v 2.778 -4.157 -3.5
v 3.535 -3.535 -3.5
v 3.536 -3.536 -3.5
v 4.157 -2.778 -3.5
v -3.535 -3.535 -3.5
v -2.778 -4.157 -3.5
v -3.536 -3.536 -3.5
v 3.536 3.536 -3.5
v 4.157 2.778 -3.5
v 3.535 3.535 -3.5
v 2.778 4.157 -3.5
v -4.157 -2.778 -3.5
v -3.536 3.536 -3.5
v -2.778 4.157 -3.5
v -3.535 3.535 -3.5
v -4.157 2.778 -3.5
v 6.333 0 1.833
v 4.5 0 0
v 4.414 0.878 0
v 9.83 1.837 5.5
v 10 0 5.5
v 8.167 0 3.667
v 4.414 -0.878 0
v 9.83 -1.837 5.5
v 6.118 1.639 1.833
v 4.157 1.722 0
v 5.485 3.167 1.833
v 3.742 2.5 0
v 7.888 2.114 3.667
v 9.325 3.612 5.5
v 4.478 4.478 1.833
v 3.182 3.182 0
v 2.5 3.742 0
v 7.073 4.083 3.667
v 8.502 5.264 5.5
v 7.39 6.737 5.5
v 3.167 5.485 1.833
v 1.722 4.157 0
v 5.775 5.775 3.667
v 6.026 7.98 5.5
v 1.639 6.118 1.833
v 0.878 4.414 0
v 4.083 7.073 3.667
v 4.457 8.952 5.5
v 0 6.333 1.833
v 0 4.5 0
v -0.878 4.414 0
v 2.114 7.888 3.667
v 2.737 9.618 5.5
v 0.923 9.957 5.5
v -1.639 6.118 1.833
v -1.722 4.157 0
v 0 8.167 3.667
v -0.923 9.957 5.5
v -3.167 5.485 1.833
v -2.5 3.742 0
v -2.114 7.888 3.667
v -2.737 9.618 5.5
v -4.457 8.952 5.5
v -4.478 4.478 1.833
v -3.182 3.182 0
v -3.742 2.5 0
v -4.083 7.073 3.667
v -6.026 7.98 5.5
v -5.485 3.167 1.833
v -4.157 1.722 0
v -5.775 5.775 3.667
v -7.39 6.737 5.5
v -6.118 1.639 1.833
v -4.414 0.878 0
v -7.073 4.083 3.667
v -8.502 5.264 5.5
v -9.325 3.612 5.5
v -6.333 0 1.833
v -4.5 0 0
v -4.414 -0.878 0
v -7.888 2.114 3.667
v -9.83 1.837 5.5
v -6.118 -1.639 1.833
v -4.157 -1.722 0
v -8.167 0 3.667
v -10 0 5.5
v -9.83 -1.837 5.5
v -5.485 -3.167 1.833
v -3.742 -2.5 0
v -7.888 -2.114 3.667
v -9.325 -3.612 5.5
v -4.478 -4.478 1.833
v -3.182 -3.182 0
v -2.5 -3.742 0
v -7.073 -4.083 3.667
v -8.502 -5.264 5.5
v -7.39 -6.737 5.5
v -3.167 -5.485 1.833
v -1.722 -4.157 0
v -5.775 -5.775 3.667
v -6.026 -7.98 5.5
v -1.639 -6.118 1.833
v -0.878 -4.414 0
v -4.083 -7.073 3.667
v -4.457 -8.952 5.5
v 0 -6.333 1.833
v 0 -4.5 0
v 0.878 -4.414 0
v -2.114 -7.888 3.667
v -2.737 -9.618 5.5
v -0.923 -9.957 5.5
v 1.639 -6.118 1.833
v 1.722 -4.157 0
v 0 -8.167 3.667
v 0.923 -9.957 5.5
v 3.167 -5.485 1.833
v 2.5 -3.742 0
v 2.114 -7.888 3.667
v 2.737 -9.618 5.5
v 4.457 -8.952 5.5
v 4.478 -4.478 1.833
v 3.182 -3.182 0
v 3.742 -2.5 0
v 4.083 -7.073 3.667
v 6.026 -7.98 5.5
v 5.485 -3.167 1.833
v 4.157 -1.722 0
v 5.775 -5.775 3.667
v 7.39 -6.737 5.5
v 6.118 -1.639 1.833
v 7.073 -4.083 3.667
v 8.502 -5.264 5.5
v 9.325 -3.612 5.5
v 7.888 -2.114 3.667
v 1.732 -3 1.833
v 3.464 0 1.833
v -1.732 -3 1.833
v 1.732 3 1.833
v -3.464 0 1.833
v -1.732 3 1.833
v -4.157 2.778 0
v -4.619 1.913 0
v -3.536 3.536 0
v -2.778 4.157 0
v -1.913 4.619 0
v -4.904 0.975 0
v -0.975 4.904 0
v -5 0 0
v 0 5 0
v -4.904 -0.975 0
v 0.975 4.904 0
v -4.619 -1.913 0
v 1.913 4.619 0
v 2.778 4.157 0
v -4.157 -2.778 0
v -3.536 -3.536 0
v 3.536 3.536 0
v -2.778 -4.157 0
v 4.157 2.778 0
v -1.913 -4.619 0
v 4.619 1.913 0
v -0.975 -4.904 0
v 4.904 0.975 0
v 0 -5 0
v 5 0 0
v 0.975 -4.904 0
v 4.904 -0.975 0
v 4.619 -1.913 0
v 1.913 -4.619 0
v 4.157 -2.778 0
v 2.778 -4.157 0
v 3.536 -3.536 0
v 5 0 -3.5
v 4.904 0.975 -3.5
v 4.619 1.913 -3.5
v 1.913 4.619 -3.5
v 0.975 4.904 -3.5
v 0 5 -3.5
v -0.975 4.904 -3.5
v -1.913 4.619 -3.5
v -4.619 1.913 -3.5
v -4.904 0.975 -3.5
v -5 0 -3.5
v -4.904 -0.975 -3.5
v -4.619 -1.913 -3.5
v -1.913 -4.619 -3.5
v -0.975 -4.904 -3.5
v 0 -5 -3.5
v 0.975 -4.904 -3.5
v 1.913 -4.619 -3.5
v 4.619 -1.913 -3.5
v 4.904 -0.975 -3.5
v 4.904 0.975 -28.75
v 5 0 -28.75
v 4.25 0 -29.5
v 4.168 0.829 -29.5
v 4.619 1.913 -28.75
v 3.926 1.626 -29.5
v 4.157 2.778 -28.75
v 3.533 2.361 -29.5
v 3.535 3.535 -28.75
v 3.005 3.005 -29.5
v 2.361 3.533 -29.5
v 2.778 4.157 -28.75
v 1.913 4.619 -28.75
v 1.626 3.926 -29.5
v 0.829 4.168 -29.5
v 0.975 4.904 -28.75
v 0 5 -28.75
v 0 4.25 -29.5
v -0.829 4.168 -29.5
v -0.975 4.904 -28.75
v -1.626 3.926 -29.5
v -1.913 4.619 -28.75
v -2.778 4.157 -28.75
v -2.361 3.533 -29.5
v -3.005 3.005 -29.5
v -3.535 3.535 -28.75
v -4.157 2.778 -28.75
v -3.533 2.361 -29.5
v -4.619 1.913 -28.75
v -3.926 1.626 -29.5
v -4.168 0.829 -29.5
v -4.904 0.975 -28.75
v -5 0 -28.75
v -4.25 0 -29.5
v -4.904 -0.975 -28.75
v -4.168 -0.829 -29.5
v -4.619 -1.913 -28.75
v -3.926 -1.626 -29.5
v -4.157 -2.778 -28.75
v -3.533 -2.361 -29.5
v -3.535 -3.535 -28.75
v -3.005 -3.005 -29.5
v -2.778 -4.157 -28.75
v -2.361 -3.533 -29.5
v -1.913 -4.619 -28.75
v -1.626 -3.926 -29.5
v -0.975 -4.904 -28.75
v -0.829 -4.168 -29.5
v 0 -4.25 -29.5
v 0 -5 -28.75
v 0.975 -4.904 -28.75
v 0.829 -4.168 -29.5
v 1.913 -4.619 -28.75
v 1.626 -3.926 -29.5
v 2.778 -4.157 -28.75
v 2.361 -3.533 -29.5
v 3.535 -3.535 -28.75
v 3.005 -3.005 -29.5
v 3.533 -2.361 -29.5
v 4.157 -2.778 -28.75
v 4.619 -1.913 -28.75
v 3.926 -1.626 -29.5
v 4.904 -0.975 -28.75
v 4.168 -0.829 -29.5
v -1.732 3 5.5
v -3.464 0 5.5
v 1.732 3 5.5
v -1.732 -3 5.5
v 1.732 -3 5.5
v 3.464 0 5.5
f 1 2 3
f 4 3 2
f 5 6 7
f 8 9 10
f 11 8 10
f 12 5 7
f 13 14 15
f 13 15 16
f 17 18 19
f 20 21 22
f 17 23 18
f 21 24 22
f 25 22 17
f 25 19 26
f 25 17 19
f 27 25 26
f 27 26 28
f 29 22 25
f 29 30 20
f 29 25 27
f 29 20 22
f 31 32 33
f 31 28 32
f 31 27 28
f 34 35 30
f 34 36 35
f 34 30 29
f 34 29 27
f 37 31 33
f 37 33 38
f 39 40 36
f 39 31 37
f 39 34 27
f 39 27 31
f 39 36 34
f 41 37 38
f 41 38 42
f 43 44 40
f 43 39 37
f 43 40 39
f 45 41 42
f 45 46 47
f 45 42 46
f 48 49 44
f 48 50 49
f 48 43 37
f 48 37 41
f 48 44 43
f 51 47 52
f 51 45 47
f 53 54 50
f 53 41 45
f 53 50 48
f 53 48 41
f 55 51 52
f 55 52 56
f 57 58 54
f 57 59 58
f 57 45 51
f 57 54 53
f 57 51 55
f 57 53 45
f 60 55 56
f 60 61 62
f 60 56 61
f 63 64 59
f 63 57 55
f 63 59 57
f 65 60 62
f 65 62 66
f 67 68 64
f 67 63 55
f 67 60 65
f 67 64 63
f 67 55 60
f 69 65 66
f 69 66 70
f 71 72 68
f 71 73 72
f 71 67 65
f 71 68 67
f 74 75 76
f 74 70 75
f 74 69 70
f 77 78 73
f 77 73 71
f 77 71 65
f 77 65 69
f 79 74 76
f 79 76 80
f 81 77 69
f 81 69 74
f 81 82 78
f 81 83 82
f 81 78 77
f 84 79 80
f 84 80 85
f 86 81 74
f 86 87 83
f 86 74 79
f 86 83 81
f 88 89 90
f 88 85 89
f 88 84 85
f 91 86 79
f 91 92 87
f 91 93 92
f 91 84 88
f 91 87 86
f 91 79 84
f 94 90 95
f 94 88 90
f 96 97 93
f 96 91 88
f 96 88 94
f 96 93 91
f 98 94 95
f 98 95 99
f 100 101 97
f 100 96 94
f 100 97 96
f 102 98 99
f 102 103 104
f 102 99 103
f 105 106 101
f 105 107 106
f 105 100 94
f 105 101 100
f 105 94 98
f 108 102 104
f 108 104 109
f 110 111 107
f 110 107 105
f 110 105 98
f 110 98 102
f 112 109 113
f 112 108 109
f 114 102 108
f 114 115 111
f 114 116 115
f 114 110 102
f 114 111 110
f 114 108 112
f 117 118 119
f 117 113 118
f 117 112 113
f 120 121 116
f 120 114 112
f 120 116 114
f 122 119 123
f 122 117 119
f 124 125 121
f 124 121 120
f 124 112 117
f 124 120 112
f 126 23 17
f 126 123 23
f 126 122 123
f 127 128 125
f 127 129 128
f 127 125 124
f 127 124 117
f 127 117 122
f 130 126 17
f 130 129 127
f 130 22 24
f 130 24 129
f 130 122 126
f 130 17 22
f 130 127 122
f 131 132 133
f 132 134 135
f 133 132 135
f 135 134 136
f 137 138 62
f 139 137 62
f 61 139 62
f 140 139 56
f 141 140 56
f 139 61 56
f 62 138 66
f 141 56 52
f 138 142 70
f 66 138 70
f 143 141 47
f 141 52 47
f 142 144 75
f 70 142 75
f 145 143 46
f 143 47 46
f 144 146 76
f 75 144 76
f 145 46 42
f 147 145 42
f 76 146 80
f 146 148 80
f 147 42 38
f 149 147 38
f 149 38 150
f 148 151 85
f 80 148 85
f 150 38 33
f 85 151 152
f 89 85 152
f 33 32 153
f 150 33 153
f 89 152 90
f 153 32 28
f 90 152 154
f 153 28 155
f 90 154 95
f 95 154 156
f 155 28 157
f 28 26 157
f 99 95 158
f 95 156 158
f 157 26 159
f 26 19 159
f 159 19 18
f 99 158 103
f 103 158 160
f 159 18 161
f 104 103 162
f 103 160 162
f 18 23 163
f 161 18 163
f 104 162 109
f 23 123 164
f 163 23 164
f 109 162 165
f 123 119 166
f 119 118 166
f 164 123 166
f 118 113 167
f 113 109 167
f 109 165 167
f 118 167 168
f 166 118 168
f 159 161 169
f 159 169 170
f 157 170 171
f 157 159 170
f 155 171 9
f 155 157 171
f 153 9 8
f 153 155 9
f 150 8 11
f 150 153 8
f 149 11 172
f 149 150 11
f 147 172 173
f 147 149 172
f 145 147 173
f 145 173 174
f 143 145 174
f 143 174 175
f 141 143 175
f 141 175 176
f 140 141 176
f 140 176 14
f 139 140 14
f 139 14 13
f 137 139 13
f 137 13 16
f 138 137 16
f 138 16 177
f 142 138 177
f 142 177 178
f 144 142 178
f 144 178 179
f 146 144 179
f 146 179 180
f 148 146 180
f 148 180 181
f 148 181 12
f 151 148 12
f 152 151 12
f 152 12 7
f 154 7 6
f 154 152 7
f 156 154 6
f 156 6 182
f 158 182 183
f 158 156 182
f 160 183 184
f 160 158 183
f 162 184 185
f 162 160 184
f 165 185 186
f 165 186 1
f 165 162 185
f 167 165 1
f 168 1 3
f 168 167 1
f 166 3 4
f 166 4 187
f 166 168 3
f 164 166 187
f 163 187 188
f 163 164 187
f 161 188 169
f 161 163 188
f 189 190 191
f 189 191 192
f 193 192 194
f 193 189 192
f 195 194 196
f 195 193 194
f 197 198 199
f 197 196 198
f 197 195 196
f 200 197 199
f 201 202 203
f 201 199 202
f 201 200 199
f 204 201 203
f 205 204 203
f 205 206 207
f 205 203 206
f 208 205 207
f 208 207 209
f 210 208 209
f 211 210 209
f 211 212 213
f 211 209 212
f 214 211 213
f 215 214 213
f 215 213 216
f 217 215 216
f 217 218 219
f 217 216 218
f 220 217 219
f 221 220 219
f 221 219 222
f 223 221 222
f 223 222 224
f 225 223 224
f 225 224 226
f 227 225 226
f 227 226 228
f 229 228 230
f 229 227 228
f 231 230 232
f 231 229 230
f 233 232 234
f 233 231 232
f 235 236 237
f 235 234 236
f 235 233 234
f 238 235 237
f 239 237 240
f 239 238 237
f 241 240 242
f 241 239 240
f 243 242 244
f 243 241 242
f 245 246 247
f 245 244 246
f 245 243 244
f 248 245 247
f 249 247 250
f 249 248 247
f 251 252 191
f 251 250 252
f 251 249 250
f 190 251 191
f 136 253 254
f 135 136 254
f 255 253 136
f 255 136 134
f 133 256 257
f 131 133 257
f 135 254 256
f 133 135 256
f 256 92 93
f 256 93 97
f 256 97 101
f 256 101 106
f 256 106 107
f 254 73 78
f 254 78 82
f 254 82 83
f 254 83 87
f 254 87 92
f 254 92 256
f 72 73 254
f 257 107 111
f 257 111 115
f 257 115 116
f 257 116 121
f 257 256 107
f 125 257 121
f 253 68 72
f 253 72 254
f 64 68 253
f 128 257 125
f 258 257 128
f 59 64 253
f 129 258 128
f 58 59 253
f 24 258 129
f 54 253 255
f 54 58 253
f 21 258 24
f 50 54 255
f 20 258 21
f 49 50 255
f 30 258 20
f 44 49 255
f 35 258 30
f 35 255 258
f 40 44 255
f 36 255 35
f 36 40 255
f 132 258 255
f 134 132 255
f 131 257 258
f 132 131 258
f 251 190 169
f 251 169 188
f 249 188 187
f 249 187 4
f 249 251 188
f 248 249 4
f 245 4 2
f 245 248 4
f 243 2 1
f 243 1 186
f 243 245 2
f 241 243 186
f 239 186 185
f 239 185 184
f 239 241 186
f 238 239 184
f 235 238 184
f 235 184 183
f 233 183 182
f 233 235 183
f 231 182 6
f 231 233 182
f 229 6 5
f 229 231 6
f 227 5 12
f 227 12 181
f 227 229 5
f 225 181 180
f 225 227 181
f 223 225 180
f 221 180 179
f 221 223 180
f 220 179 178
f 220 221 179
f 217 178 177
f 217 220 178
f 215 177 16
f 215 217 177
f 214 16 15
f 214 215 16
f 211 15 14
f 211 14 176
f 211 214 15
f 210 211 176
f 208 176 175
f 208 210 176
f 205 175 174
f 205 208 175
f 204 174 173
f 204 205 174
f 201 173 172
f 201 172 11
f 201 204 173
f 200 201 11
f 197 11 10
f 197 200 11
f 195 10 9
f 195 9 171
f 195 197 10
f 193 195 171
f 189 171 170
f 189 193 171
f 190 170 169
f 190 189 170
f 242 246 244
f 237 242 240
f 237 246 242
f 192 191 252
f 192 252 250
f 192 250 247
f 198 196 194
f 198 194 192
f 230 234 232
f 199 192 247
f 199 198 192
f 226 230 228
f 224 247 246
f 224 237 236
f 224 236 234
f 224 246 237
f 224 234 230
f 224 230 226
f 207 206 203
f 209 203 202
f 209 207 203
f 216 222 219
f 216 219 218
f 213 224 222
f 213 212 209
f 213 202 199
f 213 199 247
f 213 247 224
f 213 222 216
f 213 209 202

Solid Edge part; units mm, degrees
sketch "Sketch1" plane through (0, 0, 0) normal (0, 0, 1) x (1, 0, 0)
  circle A0 centre (0, 0) radius 10
  dimension "D1" = 20
extrude "Protrusion1" add sketch "Sketch1" along normal blind 5.5
sketch "Sketch2" plane through (0, 0, 0) normal (0, 0, -1) x (1, 0, 0)
  circle A0 centre (0, 0) radius 5
extrude "Protrusion2" add sketch "Sketch2" along normal blind 29.5
sketch "Sketch3" plane through (0, 0, -29.5) normal (0, 0, -1) x (1, 0, 0)
  circle A0 centre (0, 0) radius 4.9997
extrude "Cutout1" cut sketch "Sketch3" against normal blind 26 flip side to cut
chamfer "Chamfer_1" distance 0.75 angle 45 1 edges at (-4.9997, 0, -29.5)
sketch "Sketch4" plane through (0, 0, 5.5) normal (0, 0, 1) x (1, 0, 0)
  line L0 (-1.7321, 3) -> (1.7321, 3)
  line L1 (3.4641, 0) -> (1.7321, 3)
  line L2 (1.7321, -3) -> (3.4641, 0)
  line L3 (-1.7321, -3) -> (1.7321, -3)
  line L4 (-3.4641, 0) -> (-1.7321, -3)
  line L5 (-1.7321, 3) -> (-3.4641, 0)
  dimension "D1" = 6
extrude "Cutout2" cut sketch "Sketch4" against normal blind 3.6667
sketch "Sketch5" plane through (0, 0, 0) normal (0, -1, 0) x (1, 0, 0)
  line L0 (10, 5.5) -> (4.5, 0)
  line L1 (4.5, 0) -> (10, 0)
  line L2 (10, 0) -> (10, 5.5)
revolve "RevolvedCutout1" cut sketch "Sketch5" angle 360 about axis through (0, 0, 14.0017) along (0, 0, -1)
properties part number "185738" material "Stainless Steel, 304"
